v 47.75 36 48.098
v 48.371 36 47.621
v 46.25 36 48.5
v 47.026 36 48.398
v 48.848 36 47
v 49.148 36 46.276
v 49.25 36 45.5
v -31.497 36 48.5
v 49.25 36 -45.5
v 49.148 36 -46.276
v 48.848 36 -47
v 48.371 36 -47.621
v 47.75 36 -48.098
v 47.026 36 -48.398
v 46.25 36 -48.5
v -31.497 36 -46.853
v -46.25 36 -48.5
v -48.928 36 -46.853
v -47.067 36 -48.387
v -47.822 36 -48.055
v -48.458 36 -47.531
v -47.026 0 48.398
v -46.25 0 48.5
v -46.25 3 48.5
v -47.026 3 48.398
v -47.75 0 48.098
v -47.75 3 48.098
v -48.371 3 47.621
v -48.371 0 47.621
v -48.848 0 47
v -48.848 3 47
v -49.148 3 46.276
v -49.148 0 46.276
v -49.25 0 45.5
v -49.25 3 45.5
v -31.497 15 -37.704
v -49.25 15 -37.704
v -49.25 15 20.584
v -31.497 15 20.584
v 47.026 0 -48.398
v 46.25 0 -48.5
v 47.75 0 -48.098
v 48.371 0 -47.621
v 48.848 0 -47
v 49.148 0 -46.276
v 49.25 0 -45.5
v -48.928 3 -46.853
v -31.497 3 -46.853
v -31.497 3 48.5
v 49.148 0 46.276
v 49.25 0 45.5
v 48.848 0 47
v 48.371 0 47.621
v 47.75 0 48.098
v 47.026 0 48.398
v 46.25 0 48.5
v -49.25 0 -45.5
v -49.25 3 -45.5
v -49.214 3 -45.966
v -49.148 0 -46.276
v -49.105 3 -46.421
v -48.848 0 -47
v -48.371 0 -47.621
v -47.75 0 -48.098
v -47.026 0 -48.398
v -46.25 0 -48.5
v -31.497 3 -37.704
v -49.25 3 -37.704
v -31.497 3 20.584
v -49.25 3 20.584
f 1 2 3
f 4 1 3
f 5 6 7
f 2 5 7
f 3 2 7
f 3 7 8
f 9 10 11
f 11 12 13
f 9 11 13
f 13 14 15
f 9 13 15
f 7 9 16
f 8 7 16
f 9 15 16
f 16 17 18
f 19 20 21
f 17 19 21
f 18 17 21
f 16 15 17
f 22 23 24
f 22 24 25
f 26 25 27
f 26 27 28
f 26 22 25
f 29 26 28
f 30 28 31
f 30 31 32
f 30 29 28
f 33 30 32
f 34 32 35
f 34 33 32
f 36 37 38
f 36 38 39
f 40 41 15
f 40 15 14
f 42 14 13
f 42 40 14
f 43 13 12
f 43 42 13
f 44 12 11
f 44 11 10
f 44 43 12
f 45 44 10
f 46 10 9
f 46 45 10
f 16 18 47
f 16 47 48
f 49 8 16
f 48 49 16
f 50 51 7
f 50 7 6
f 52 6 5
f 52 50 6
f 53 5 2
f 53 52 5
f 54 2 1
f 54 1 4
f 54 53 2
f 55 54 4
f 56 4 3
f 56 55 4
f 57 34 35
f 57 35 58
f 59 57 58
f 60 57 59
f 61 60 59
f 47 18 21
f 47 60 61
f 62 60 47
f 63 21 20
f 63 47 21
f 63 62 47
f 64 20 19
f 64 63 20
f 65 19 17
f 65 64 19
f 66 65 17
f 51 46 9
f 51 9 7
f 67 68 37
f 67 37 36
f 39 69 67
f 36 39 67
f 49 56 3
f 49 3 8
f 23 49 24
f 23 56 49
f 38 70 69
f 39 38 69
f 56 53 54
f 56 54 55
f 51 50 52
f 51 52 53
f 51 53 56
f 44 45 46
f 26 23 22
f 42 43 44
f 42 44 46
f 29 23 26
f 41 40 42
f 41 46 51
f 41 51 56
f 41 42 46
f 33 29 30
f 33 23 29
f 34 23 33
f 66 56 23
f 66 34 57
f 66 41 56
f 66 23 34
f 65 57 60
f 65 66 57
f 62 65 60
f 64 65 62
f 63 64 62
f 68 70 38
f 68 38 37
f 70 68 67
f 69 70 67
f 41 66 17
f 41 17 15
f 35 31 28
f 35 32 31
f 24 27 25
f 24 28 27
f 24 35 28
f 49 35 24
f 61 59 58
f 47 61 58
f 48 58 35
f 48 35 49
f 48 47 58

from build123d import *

# Parameters (mm, degrees)
BOSS_EXTRUDE1_DEPTH = 36
SKETCH2_W           = 25.092767626
SKETCH2_H           = 98.018623538
CUT_EXTRUDE1_DEPTH  = 33
SKETCH3_W           = 17.75334897
SKETCH3_H           = 58.288408131
BOSS_EXTRUDE2_DEPTH = 12


with BuildPart() as part:
    # Sketch1 → Boss-Extrude1 (new body)
    with BuildSketch(Plane(origin=(0, 0, 0), x_dir=(1, 0, 0), z_dir=(0, 1, 0))):
        with BuildLine():
            Line((-46.25, 48.5), (46.25, 48.5))
            ThreePointArc((46.25, 48.5), (48.371320344, 47.621320344), (49.25, 45.5))
            Line((49.25, 45.5), (49.25, -45.5))
            ThreePointArc((49.25, -45.5), (48.371320344, -47.621320344), (46.25, -48.5))
            Line((46.25, -48.5), (-46.25, -48.5))
            ThreePointArc((-46.25, -48.5), (-48.371320344, -47.621320344), (-49.25, -45.5))
            Line((-49.25, -45.5), (-49.25, 45.5))
            ThreePointArc((-49.25, 45.5), (-48.371320344, 47.621320344), (-46.25, 48.5))
        make_face()
    extrude(amount=BOSS_EXTRUDE1_DEPTH)

    # Sketch2 → Cut-Extrude1 (cut)
    with BuildSketch(Plane(origin=(0, 36, 0), x_dir=(1, 0, 0), z_dir=(0, 1, 0))):
        with Locations((-44.043034843, -2.156409718)):
            Rectangle(SKETCH2_W, SKETCH2_H)
    extrude(amount=-CUT_EXTRUDE1_DEPTH, mode=Mode.SUBTRACT)


with BuildPart() as body_2:
    # Sketch3 → Boss-Extrude2 (new body)
    with BuildSketch(Plane(origin=(0, 3, 0), x_dir=(1, 0, 0), z_dir=(0, 1, 0))):
        with Locations((-40.373325515, 8.560293123)):
            Rectangle(SKETCH3_W, SKETCH3_H)
    extrude(amount=BOSS_EXTRUDE2_DEPTH)


solid = Compound([part.part, body_2.part])
